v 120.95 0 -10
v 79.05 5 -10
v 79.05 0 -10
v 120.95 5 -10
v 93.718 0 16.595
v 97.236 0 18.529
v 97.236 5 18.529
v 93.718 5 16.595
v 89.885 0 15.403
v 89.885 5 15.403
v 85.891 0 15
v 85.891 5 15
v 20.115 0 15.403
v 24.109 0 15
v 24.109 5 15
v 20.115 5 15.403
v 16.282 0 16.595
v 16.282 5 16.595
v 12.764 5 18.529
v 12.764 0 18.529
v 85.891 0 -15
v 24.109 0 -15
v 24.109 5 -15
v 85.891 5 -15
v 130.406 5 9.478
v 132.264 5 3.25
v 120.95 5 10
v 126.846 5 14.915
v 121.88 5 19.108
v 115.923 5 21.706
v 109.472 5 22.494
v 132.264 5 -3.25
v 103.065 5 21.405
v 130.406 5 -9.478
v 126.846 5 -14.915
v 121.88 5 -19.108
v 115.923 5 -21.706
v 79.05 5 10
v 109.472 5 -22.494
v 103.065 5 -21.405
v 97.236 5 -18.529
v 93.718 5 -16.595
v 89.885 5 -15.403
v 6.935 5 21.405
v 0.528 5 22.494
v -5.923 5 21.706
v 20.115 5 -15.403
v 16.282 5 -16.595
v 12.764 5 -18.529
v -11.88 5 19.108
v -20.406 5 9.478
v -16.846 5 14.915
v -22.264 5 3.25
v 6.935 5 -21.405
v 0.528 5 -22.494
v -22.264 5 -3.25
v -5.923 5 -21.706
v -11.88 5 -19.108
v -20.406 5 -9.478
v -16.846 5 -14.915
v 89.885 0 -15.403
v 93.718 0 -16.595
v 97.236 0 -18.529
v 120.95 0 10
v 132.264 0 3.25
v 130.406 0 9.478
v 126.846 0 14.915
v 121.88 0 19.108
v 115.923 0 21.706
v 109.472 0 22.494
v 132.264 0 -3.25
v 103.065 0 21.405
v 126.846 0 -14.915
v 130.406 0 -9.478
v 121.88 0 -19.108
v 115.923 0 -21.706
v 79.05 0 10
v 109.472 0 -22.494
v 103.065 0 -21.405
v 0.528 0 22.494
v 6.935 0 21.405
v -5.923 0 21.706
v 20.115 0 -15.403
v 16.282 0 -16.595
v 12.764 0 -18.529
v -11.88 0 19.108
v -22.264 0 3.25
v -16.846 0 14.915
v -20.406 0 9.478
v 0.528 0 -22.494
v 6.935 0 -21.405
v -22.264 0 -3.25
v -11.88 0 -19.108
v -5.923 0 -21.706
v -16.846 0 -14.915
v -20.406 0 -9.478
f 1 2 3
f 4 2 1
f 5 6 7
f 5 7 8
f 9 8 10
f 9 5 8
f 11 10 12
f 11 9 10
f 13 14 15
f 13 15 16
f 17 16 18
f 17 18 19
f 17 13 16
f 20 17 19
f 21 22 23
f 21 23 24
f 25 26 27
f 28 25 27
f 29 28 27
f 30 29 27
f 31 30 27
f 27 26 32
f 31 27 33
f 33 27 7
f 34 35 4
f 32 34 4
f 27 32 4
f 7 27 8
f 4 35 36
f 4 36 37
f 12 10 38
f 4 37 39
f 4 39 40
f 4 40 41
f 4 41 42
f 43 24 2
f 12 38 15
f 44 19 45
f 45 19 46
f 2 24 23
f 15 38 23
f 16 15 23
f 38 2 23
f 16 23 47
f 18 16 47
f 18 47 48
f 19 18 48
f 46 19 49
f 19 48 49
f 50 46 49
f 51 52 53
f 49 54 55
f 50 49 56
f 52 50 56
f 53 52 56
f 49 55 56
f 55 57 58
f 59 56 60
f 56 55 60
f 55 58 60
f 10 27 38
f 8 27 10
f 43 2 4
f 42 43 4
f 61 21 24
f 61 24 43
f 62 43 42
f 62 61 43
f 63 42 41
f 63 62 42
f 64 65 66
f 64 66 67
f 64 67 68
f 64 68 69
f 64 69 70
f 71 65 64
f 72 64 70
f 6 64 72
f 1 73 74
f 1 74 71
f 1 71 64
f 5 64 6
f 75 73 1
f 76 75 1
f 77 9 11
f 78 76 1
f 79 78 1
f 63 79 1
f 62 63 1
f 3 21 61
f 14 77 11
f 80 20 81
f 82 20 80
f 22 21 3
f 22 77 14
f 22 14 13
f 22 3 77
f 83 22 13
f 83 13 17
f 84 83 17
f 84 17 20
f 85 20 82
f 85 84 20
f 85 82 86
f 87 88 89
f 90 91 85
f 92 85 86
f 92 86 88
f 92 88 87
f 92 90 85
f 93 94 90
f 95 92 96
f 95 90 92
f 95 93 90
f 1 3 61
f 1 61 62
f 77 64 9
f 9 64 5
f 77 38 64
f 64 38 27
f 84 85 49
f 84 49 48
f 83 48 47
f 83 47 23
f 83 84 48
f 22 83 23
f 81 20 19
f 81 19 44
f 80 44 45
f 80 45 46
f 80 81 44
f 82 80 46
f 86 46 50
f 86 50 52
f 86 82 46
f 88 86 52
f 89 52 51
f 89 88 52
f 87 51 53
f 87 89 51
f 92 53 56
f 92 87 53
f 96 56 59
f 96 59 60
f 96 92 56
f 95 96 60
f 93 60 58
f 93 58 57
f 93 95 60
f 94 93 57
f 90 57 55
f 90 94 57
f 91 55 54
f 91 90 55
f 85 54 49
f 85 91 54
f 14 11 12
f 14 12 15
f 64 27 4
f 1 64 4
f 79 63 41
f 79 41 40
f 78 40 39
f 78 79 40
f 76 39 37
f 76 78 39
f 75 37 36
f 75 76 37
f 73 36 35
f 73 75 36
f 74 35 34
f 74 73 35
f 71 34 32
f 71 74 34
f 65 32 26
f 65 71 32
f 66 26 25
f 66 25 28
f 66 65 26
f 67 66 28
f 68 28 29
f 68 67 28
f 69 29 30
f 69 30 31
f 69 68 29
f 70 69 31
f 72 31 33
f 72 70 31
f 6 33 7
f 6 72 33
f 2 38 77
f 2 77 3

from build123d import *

# Parameters (mm, degrees)
BOSS_EXTRUDE1_DEPTH = 5
SKETCH3_W           = 41.9
SKETCH3_H           = 20
CUT_EXTRUDE1_DEPTH  = 135.489776563


with BuildPart() as part:
    # Sketch2 → Boss-Extrude1 (new body)
    with BuildSketch(Plane(origin=(0, 0, 0), x_dir=(1, 0, 0), z_dir=(0, 1, 0))):
        with BuildLine():
            Line((24.109126902, 15), (85.890873098, 15))
            ThreePointArc((85.890873098, 15), (91.831758355, 15.902725787), (97.236344581, 18.529411765))
            ThreePointArc((97.236344581, 18.529411765), (132.5, 0), (97.236344581, -18.529411765))
            ThreePointArc((97.236344581, -18.529411765), (91.831758355, -15.902725787), (85.890873098, -15))
            Line((85.890873098, -15), (24.109126902, -15))
            ThreePointArc((24.109126902, -15), (18.168241645, -15.902725787), (12.763655419, -18.529411765))
            ThreePointArc((12.763655419, -18.529411765), (-22.5, 0), (12.763655419, 18.529411765))
            ThreePointArc((12.763655419, 18.529411765), (18.168241645, 15.902725787), (24.109126902, 15))
        make_face()
    extrude(amount=BOSS_EXTRUDE1_DEPTH)

    # Sketch3 → Cut-Extrude1 (cut, through all)
    with BuildSketch(Plane(origin=(0, 5, 0), x_dir=(1, 0, 0), z_dir=(0, 1, 0))):
        with Locations((100, 0)):
            Rectangle(SKETCH3_W, SKETCH3_H)
    extrude(amount=-CUT_EXTRUDE1_DEPTH, mode=Mode.SUBTRACT)


solid = part.part
